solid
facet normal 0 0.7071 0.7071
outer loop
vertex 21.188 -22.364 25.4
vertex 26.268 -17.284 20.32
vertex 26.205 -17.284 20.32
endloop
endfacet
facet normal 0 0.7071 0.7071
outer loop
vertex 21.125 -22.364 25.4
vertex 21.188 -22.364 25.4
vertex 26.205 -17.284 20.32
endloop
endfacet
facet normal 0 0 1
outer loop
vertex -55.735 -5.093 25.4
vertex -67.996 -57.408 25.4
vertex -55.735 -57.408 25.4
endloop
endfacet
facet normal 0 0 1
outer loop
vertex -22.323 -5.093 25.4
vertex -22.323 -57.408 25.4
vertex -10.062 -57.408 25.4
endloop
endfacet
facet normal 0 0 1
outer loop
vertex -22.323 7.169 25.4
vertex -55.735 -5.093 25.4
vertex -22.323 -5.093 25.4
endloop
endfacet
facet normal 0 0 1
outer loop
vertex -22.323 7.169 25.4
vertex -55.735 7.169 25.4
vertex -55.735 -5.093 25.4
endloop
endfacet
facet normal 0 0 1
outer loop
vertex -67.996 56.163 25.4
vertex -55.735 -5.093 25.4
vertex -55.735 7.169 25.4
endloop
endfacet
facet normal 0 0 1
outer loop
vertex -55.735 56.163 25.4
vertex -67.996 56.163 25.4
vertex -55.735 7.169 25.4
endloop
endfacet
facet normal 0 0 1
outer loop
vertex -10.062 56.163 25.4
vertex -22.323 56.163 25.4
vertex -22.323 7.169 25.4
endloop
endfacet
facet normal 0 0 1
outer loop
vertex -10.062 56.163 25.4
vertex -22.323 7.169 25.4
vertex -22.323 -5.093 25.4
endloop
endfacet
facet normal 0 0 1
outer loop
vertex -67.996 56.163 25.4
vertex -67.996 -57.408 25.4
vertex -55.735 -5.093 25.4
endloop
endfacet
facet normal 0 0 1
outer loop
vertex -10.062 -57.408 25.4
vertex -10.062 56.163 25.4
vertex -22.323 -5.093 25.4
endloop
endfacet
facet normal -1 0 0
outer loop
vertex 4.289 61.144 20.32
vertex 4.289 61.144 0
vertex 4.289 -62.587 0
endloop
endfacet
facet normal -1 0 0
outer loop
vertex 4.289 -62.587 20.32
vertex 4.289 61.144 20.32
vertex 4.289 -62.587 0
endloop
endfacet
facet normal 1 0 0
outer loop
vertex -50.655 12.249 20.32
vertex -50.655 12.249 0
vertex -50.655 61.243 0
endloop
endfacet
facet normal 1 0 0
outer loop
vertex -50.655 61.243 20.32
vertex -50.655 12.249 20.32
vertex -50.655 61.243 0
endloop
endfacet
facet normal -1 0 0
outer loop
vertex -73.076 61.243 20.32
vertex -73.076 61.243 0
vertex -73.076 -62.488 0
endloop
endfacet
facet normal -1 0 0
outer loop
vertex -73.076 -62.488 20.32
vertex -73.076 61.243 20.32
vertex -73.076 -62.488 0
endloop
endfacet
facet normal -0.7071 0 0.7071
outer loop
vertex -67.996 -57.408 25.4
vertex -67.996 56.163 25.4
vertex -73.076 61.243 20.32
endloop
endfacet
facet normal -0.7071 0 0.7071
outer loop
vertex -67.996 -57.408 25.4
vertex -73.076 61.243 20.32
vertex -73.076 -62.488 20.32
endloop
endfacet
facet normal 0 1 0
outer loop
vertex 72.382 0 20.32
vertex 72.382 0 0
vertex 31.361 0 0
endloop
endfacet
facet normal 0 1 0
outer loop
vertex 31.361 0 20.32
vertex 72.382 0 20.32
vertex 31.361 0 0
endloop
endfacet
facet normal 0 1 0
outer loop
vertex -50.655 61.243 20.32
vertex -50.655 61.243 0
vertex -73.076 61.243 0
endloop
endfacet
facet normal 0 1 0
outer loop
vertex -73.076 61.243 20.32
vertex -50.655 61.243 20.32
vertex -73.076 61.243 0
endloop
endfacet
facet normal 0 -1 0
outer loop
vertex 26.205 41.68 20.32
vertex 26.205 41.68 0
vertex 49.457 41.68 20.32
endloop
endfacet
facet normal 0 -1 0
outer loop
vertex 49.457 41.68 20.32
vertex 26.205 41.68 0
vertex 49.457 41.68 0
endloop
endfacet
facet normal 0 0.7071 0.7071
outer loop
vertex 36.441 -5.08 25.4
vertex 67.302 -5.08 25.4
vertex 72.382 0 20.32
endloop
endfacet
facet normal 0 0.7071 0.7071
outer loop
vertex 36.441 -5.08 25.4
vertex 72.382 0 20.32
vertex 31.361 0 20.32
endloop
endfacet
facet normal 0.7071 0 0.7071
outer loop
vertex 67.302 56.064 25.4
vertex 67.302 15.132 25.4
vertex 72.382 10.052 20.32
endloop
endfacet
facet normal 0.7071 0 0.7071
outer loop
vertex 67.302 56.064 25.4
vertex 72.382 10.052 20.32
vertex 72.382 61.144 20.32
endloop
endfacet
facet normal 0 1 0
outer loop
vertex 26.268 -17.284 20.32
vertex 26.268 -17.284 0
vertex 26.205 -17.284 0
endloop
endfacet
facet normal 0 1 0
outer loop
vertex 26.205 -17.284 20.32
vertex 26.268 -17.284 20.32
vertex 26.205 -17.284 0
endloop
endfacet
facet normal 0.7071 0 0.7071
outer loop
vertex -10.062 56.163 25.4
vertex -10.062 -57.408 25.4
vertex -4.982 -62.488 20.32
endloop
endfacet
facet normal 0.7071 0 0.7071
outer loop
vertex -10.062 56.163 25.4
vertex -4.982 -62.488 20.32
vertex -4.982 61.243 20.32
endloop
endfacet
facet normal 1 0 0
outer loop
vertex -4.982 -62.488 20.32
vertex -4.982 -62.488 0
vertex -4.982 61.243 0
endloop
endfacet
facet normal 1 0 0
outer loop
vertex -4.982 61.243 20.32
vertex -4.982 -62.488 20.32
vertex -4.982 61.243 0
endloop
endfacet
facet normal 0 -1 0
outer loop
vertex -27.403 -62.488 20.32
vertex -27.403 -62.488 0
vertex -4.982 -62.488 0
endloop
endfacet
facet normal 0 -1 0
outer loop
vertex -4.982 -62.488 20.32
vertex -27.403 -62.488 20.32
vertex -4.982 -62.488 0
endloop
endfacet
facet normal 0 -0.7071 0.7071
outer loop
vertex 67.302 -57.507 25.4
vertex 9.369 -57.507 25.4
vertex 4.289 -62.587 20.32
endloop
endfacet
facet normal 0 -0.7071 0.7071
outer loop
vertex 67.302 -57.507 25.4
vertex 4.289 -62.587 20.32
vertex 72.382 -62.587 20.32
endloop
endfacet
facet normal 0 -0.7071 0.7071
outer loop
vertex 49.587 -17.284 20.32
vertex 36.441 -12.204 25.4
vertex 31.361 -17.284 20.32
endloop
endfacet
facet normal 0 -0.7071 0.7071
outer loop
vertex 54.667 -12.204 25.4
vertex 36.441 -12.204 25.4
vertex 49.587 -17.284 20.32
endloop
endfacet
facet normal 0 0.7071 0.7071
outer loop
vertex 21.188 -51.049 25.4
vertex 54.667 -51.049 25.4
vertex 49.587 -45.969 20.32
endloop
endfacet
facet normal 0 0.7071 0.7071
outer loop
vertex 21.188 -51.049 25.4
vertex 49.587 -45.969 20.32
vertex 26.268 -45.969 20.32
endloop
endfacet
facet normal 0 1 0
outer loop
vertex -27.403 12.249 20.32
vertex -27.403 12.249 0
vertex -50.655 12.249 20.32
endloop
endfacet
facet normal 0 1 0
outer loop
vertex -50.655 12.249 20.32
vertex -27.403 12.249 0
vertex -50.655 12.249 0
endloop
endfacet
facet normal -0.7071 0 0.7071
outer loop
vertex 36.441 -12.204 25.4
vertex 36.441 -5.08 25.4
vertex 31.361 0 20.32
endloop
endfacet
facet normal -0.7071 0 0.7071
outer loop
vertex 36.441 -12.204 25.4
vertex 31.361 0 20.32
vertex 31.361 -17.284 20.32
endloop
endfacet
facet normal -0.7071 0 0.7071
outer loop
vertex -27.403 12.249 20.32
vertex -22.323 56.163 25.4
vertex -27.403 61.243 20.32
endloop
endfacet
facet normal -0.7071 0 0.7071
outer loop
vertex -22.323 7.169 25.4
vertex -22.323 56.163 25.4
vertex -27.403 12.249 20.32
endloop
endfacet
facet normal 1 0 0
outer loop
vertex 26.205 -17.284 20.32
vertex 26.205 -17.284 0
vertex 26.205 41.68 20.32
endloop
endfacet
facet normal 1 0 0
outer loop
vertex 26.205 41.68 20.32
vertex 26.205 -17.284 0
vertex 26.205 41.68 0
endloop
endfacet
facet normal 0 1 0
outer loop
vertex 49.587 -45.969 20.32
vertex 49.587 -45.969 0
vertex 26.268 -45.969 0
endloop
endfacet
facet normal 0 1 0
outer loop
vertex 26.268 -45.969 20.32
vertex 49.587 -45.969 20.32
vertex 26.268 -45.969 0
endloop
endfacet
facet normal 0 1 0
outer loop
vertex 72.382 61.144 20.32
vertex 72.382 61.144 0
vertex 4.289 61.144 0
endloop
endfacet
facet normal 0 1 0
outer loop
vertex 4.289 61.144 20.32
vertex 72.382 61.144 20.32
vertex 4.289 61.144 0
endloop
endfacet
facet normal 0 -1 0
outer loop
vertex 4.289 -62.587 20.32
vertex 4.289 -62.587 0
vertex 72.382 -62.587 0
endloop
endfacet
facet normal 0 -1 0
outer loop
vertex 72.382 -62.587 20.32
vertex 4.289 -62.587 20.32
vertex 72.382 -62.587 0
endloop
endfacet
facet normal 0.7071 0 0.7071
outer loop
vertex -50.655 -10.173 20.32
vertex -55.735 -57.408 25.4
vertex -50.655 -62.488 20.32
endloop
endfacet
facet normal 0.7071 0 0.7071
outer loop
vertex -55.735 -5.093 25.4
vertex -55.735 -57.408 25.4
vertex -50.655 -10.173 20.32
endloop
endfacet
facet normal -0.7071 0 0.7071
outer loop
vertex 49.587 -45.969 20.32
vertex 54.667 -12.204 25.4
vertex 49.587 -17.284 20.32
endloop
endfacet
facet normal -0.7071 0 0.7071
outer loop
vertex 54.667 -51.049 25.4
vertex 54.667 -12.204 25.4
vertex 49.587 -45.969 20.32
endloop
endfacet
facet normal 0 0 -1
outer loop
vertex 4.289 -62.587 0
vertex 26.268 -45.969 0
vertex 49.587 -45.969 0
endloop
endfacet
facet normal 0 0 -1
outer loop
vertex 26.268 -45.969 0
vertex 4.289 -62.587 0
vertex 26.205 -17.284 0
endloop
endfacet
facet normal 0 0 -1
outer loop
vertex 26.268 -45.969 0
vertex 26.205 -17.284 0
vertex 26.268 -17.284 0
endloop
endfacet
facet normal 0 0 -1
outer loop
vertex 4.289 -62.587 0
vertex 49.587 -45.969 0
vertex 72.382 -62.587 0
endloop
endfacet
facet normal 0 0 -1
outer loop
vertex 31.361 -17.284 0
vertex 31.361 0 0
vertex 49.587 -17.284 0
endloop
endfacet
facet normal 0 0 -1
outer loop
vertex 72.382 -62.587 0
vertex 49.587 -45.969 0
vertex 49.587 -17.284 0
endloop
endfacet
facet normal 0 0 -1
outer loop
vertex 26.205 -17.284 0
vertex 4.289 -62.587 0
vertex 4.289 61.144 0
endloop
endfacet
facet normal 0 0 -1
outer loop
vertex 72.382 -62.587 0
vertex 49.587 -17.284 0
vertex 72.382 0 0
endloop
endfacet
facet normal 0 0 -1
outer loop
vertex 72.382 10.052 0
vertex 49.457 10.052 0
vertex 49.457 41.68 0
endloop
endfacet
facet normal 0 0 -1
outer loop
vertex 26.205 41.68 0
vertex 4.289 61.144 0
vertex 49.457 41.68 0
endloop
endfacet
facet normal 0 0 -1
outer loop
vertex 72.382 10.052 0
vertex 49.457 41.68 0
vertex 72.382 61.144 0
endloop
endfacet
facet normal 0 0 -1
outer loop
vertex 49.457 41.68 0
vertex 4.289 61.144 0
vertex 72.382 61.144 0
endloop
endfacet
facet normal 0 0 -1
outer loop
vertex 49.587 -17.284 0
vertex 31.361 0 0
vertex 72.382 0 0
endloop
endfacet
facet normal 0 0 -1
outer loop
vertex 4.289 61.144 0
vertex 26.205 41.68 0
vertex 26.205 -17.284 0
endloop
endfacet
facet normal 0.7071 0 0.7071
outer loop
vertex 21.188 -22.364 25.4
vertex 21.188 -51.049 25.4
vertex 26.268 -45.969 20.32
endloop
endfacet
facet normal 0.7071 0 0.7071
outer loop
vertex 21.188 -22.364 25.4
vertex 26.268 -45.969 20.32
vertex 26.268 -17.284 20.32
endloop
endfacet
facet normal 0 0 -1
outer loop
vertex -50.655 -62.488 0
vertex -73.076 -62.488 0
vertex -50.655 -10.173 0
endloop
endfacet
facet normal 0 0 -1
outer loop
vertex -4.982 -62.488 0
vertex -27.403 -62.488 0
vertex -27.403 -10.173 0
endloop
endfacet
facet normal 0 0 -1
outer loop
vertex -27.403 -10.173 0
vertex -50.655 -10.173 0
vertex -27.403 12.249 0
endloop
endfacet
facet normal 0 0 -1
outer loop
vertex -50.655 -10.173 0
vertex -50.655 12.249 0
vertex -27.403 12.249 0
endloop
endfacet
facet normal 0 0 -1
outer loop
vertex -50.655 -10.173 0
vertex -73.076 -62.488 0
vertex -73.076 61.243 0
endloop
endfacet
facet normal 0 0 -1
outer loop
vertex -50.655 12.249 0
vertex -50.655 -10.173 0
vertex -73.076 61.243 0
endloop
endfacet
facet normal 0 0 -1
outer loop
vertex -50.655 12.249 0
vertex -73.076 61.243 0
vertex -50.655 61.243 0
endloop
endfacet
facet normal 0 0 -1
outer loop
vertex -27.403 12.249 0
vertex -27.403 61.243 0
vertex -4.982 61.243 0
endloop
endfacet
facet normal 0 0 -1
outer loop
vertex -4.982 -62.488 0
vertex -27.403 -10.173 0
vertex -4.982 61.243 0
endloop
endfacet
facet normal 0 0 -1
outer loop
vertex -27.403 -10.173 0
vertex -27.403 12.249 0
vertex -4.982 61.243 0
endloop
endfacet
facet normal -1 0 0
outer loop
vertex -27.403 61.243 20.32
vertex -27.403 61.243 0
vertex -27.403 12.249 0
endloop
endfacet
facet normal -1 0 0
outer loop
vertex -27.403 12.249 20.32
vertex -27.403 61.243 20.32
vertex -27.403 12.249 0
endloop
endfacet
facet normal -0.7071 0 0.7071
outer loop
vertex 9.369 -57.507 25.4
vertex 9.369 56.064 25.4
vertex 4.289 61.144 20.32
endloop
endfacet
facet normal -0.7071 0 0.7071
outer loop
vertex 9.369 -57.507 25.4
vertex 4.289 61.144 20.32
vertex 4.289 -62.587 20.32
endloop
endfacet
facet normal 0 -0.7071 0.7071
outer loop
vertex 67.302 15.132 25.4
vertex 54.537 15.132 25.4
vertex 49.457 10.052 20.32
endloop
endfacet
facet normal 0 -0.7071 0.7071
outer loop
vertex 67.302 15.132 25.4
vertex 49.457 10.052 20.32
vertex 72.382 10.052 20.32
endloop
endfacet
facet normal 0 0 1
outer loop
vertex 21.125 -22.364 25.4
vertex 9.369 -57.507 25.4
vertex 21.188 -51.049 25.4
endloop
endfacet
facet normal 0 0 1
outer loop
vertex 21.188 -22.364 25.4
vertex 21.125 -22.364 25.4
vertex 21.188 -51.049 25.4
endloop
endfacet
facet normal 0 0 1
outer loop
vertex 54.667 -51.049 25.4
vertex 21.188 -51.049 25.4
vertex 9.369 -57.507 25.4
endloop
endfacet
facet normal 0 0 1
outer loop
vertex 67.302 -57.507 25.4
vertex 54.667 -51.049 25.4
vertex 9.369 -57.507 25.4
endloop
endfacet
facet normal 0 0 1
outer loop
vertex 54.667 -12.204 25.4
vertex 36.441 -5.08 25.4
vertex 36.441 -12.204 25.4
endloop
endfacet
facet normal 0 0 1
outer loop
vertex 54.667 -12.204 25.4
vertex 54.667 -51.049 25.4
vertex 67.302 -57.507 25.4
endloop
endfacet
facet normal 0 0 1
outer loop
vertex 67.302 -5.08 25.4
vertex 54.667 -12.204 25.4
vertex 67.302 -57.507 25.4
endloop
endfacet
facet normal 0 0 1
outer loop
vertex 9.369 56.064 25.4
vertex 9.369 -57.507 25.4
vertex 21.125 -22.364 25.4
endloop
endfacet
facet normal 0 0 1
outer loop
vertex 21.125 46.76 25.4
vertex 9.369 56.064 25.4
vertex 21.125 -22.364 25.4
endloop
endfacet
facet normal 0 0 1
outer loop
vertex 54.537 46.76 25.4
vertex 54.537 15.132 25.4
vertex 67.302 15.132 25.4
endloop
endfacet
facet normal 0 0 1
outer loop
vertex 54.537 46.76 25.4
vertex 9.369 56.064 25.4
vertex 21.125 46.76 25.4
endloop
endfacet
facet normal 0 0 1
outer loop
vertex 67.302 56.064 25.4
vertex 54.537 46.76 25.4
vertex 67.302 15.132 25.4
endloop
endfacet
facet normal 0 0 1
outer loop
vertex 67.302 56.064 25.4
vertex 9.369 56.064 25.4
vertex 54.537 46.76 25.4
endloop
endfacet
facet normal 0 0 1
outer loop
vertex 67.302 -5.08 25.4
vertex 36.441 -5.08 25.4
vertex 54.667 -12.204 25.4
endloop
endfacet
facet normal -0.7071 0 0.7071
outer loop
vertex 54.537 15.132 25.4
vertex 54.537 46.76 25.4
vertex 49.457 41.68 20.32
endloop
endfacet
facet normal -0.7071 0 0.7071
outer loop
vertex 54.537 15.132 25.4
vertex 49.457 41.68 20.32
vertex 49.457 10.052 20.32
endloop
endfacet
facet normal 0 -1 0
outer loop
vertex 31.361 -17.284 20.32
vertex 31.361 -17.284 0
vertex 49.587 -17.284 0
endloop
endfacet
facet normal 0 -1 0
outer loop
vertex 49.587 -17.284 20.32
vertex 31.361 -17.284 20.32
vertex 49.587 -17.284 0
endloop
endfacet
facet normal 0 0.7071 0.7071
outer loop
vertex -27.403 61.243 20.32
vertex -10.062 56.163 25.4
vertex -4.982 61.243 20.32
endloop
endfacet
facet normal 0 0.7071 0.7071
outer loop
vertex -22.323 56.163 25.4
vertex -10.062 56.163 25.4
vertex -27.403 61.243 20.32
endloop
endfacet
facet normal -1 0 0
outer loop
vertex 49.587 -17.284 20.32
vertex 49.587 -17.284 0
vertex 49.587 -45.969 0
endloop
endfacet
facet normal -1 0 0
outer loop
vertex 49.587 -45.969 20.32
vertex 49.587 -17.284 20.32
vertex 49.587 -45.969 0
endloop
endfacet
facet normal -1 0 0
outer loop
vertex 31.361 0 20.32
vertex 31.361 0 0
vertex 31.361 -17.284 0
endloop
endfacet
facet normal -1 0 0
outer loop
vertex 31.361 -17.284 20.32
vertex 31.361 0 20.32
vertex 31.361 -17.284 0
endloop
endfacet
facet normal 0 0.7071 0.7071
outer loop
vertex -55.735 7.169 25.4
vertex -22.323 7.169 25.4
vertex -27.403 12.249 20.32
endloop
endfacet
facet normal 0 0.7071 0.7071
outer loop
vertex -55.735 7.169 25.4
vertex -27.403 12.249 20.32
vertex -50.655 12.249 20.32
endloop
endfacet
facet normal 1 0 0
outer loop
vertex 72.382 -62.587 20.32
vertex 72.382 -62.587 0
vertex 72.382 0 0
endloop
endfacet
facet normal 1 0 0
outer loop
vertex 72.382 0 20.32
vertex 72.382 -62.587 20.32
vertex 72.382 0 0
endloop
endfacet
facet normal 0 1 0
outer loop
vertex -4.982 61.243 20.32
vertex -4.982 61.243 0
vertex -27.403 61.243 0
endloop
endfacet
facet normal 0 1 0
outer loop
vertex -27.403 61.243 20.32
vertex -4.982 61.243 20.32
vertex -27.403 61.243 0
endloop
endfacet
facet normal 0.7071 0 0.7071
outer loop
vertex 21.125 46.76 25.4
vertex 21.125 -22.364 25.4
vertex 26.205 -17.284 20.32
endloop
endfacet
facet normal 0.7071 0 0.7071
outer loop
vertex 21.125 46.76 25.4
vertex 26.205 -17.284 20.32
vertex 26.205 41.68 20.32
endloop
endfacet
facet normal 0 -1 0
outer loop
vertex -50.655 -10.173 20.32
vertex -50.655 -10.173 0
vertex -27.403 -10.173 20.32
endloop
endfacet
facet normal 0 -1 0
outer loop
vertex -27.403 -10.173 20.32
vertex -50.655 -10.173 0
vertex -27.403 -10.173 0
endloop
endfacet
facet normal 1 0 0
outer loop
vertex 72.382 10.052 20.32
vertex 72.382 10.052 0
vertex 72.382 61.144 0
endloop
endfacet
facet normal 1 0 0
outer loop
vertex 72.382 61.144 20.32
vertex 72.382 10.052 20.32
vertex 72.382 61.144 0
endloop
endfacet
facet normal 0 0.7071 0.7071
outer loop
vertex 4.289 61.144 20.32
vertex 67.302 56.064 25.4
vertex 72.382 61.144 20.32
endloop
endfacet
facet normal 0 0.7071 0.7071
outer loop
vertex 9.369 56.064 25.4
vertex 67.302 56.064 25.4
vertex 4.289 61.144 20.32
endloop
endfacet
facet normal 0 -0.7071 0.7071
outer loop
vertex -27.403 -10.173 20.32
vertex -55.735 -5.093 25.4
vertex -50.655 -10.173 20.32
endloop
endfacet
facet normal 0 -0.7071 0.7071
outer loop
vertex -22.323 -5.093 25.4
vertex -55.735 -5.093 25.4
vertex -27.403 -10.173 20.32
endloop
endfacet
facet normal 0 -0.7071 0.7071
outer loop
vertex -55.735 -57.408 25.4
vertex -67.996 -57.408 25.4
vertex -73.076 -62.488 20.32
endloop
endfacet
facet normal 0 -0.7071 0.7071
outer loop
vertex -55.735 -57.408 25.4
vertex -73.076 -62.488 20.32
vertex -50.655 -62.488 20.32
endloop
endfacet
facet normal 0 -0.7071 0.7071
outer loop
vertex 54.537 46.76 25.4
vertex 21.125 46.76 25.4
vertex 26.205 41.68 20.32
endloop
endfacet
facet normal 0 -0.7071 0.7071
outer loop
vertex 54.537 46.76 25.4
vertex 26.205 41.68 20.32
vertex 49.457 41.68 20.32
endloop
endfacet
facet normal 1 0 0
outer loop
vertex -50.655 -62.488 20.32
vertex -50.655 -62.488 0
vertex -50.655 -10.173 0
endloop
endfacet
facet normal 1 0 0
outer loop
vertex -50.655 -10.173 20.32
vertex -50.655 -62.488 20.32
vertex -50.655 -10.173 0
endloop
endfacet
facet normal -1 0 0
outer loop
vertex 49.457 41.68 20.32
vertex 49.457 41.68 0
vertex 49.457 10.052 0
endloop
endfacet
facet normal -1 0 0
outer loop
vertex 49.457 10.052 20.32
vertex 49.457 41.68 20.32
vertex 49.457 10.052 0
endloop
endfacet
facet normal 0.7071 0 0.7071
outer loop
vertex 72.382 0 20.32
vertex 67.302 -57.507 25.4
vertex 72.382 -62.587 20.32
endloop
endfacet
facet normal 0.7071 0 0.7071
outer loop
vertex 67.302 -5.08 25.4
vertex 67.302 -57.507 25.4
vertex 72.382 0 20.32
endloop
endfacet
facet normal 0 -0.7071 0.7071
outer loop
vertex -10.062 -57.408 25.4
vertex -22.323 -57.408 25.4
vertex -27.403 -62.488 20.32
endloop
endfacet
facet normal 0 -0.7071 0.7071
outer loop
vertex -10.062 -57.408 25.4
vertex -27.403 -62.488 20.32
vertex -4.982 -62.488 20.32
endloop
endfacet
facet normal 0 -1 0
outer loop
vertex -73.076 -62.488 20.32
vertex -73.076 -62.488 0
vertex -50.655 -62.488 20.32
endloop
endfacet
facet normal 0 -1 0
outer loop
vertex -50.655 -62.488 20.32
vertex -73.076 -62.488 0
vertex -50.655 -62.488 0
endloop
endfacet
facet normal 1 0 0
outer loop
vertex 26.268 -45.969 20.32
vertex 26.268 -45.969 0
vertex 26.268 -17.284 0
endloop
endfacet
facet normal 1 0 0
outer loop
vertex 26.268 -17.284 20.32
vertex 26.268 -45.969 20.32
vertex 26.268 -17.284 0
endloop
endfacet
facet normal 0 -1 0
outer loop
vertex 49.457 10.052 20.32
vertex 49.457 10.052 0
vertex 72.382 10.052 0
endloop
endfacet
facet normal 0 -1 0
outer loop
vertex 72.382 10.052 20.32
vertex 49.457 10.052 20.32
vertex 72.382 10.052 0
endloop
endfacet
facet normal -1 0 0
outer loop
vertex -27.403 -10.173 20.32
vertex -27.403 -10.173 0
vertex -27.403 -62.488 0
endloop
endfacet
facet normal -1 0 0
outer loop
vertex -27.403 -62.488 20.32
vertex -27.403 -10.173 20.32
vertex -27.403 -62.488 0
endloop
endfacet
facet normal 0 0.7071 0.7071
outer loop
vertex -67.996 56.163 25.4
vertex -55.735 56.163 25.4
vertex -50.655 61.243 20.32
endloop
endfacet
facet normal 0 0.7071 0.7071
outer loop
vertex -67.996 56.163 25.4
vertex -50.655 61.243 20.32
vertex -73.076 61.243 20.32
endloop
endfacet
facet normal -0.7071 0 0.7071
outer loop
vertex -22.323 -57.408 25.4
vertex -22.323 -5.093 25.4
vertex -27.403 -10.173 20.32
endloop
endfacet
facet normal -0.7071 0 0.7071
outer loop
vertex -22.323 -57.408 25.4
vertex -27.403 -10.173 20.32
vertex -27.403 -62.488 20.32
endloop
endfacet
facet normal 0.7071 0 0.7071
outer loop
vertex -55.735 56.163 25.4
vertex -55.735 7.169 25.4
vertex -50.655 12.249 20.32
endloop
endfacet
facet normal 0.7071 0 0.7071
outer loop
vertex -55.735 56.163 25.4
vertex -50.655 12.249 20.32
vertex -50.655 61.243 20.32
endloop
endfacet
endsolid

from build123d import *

# Parameters (mm, degrees)
F1_DEPTH  = 25.4
F2_DEPTH  = 25.4
F3_SIZE   = 5.08
F3_2_SIZE = 5.08


with BuildPart() as f1:
    # F0 (on Top) → F1 (new body)
    with BuildSketch(Plane.XY):
        Polygon((-50.654951, 61.242655), (-73.075995, 61.242655), (-73.075995, -62.48828), (-50.654951, -62.48828), (-50.654951, -10.172517), (-27.403498, -10.172517), (-27.403498, -62.48828), (-4.982455, -62.48828), (-4.982455, 61.242655), (-27.403498, 61.242655), (-27.403498, 12.248525), (-50.654951, 12.248525), align=None)
    extrude(amount=F1_DEPTH)

    # F3
    f3_edges = [f1.edges().sort_by_distance(p)[0] for p in [
        (-61.865473, 61.242655, 25.4),
        (-73.075995, -0.622813, 25.4),
        (-61.865473, -62.48828, 25.4),
        (-50.654951, -36.330399, 25.4),
        (-39.029225, -10.172517, 25.4),
        (-27.403498, -36.330399, 25.4),
        (-16.192977, -62.48828, 25.4),
        (-4.982455, -0.622813, 25.4),
        (-16.192977, 61.242655, 25.4),
        (-27.403498, 36.74559, 25.4),
        (-39.029225, 12.248525, 25.4),
        (-50.654951, 36.74559, 25.4),
    ]]
    chamfer(f3_edges, length=F3_SIZE)


with BuildPart() as f2:
    # F0 (on Top) → F2 (new body)
    with BuildSketch(Plane.XY):
        Polygon((72.382182, 61.143547), (4.288642, 61.143547), (4.288642, -62.587388), (72.382182, -62.587388), (72.382182, 0), (49.456822, 0), (31.360701, 0), (31.360701, -17.28439), (49.58744, -17.28439), (49.58744, -45.968894), (26.26794, -45.968894), (26.26794, -17.28439), (26.205368, -17.28439), (26.205368, 0), (26.205368, 41.680254), (49.456822, 41.680254), (49.456822, 10.051508), (72.382182, 10.051508), align=None)
    extrude(amount=F2_DEPTH)

    # F3#2
    f3_2_edges = [f2.edges().sort_by_distance(p)[0] for p in [
        (49.456822, 25.865881, 25.4),
        (60.919502, 10.051508, 25.4),
        (72.382182, 35.597527, 25.4),
        (38.335412, 61.143547, 25.4),
        (4.288642, -0.72192, 25.4),
        (38.335412, -62.587388, 25.4),
        (72.382182, -31.293694, 25.4),
        (51.871441, 0, 25.4),
        (31.360701, -8.642195, 25.4),
        (40.47407, -17.28439, 25.4),
        (49.58744, -31.626642, 25.4),
        (37.92769, -45.968894, 25.4),
        (26.26794, -31.626642, 25.4),
        (26.236654, -17.28439, 25.4),
        (26.205368, 12.197932, 25.4),
        (37.831095, 41.680254, 25.4),
    ]]
    chamfer(f3_2_edges, length=F3_2_SIZE)


solid = Compound([f1.part, f2.part])
